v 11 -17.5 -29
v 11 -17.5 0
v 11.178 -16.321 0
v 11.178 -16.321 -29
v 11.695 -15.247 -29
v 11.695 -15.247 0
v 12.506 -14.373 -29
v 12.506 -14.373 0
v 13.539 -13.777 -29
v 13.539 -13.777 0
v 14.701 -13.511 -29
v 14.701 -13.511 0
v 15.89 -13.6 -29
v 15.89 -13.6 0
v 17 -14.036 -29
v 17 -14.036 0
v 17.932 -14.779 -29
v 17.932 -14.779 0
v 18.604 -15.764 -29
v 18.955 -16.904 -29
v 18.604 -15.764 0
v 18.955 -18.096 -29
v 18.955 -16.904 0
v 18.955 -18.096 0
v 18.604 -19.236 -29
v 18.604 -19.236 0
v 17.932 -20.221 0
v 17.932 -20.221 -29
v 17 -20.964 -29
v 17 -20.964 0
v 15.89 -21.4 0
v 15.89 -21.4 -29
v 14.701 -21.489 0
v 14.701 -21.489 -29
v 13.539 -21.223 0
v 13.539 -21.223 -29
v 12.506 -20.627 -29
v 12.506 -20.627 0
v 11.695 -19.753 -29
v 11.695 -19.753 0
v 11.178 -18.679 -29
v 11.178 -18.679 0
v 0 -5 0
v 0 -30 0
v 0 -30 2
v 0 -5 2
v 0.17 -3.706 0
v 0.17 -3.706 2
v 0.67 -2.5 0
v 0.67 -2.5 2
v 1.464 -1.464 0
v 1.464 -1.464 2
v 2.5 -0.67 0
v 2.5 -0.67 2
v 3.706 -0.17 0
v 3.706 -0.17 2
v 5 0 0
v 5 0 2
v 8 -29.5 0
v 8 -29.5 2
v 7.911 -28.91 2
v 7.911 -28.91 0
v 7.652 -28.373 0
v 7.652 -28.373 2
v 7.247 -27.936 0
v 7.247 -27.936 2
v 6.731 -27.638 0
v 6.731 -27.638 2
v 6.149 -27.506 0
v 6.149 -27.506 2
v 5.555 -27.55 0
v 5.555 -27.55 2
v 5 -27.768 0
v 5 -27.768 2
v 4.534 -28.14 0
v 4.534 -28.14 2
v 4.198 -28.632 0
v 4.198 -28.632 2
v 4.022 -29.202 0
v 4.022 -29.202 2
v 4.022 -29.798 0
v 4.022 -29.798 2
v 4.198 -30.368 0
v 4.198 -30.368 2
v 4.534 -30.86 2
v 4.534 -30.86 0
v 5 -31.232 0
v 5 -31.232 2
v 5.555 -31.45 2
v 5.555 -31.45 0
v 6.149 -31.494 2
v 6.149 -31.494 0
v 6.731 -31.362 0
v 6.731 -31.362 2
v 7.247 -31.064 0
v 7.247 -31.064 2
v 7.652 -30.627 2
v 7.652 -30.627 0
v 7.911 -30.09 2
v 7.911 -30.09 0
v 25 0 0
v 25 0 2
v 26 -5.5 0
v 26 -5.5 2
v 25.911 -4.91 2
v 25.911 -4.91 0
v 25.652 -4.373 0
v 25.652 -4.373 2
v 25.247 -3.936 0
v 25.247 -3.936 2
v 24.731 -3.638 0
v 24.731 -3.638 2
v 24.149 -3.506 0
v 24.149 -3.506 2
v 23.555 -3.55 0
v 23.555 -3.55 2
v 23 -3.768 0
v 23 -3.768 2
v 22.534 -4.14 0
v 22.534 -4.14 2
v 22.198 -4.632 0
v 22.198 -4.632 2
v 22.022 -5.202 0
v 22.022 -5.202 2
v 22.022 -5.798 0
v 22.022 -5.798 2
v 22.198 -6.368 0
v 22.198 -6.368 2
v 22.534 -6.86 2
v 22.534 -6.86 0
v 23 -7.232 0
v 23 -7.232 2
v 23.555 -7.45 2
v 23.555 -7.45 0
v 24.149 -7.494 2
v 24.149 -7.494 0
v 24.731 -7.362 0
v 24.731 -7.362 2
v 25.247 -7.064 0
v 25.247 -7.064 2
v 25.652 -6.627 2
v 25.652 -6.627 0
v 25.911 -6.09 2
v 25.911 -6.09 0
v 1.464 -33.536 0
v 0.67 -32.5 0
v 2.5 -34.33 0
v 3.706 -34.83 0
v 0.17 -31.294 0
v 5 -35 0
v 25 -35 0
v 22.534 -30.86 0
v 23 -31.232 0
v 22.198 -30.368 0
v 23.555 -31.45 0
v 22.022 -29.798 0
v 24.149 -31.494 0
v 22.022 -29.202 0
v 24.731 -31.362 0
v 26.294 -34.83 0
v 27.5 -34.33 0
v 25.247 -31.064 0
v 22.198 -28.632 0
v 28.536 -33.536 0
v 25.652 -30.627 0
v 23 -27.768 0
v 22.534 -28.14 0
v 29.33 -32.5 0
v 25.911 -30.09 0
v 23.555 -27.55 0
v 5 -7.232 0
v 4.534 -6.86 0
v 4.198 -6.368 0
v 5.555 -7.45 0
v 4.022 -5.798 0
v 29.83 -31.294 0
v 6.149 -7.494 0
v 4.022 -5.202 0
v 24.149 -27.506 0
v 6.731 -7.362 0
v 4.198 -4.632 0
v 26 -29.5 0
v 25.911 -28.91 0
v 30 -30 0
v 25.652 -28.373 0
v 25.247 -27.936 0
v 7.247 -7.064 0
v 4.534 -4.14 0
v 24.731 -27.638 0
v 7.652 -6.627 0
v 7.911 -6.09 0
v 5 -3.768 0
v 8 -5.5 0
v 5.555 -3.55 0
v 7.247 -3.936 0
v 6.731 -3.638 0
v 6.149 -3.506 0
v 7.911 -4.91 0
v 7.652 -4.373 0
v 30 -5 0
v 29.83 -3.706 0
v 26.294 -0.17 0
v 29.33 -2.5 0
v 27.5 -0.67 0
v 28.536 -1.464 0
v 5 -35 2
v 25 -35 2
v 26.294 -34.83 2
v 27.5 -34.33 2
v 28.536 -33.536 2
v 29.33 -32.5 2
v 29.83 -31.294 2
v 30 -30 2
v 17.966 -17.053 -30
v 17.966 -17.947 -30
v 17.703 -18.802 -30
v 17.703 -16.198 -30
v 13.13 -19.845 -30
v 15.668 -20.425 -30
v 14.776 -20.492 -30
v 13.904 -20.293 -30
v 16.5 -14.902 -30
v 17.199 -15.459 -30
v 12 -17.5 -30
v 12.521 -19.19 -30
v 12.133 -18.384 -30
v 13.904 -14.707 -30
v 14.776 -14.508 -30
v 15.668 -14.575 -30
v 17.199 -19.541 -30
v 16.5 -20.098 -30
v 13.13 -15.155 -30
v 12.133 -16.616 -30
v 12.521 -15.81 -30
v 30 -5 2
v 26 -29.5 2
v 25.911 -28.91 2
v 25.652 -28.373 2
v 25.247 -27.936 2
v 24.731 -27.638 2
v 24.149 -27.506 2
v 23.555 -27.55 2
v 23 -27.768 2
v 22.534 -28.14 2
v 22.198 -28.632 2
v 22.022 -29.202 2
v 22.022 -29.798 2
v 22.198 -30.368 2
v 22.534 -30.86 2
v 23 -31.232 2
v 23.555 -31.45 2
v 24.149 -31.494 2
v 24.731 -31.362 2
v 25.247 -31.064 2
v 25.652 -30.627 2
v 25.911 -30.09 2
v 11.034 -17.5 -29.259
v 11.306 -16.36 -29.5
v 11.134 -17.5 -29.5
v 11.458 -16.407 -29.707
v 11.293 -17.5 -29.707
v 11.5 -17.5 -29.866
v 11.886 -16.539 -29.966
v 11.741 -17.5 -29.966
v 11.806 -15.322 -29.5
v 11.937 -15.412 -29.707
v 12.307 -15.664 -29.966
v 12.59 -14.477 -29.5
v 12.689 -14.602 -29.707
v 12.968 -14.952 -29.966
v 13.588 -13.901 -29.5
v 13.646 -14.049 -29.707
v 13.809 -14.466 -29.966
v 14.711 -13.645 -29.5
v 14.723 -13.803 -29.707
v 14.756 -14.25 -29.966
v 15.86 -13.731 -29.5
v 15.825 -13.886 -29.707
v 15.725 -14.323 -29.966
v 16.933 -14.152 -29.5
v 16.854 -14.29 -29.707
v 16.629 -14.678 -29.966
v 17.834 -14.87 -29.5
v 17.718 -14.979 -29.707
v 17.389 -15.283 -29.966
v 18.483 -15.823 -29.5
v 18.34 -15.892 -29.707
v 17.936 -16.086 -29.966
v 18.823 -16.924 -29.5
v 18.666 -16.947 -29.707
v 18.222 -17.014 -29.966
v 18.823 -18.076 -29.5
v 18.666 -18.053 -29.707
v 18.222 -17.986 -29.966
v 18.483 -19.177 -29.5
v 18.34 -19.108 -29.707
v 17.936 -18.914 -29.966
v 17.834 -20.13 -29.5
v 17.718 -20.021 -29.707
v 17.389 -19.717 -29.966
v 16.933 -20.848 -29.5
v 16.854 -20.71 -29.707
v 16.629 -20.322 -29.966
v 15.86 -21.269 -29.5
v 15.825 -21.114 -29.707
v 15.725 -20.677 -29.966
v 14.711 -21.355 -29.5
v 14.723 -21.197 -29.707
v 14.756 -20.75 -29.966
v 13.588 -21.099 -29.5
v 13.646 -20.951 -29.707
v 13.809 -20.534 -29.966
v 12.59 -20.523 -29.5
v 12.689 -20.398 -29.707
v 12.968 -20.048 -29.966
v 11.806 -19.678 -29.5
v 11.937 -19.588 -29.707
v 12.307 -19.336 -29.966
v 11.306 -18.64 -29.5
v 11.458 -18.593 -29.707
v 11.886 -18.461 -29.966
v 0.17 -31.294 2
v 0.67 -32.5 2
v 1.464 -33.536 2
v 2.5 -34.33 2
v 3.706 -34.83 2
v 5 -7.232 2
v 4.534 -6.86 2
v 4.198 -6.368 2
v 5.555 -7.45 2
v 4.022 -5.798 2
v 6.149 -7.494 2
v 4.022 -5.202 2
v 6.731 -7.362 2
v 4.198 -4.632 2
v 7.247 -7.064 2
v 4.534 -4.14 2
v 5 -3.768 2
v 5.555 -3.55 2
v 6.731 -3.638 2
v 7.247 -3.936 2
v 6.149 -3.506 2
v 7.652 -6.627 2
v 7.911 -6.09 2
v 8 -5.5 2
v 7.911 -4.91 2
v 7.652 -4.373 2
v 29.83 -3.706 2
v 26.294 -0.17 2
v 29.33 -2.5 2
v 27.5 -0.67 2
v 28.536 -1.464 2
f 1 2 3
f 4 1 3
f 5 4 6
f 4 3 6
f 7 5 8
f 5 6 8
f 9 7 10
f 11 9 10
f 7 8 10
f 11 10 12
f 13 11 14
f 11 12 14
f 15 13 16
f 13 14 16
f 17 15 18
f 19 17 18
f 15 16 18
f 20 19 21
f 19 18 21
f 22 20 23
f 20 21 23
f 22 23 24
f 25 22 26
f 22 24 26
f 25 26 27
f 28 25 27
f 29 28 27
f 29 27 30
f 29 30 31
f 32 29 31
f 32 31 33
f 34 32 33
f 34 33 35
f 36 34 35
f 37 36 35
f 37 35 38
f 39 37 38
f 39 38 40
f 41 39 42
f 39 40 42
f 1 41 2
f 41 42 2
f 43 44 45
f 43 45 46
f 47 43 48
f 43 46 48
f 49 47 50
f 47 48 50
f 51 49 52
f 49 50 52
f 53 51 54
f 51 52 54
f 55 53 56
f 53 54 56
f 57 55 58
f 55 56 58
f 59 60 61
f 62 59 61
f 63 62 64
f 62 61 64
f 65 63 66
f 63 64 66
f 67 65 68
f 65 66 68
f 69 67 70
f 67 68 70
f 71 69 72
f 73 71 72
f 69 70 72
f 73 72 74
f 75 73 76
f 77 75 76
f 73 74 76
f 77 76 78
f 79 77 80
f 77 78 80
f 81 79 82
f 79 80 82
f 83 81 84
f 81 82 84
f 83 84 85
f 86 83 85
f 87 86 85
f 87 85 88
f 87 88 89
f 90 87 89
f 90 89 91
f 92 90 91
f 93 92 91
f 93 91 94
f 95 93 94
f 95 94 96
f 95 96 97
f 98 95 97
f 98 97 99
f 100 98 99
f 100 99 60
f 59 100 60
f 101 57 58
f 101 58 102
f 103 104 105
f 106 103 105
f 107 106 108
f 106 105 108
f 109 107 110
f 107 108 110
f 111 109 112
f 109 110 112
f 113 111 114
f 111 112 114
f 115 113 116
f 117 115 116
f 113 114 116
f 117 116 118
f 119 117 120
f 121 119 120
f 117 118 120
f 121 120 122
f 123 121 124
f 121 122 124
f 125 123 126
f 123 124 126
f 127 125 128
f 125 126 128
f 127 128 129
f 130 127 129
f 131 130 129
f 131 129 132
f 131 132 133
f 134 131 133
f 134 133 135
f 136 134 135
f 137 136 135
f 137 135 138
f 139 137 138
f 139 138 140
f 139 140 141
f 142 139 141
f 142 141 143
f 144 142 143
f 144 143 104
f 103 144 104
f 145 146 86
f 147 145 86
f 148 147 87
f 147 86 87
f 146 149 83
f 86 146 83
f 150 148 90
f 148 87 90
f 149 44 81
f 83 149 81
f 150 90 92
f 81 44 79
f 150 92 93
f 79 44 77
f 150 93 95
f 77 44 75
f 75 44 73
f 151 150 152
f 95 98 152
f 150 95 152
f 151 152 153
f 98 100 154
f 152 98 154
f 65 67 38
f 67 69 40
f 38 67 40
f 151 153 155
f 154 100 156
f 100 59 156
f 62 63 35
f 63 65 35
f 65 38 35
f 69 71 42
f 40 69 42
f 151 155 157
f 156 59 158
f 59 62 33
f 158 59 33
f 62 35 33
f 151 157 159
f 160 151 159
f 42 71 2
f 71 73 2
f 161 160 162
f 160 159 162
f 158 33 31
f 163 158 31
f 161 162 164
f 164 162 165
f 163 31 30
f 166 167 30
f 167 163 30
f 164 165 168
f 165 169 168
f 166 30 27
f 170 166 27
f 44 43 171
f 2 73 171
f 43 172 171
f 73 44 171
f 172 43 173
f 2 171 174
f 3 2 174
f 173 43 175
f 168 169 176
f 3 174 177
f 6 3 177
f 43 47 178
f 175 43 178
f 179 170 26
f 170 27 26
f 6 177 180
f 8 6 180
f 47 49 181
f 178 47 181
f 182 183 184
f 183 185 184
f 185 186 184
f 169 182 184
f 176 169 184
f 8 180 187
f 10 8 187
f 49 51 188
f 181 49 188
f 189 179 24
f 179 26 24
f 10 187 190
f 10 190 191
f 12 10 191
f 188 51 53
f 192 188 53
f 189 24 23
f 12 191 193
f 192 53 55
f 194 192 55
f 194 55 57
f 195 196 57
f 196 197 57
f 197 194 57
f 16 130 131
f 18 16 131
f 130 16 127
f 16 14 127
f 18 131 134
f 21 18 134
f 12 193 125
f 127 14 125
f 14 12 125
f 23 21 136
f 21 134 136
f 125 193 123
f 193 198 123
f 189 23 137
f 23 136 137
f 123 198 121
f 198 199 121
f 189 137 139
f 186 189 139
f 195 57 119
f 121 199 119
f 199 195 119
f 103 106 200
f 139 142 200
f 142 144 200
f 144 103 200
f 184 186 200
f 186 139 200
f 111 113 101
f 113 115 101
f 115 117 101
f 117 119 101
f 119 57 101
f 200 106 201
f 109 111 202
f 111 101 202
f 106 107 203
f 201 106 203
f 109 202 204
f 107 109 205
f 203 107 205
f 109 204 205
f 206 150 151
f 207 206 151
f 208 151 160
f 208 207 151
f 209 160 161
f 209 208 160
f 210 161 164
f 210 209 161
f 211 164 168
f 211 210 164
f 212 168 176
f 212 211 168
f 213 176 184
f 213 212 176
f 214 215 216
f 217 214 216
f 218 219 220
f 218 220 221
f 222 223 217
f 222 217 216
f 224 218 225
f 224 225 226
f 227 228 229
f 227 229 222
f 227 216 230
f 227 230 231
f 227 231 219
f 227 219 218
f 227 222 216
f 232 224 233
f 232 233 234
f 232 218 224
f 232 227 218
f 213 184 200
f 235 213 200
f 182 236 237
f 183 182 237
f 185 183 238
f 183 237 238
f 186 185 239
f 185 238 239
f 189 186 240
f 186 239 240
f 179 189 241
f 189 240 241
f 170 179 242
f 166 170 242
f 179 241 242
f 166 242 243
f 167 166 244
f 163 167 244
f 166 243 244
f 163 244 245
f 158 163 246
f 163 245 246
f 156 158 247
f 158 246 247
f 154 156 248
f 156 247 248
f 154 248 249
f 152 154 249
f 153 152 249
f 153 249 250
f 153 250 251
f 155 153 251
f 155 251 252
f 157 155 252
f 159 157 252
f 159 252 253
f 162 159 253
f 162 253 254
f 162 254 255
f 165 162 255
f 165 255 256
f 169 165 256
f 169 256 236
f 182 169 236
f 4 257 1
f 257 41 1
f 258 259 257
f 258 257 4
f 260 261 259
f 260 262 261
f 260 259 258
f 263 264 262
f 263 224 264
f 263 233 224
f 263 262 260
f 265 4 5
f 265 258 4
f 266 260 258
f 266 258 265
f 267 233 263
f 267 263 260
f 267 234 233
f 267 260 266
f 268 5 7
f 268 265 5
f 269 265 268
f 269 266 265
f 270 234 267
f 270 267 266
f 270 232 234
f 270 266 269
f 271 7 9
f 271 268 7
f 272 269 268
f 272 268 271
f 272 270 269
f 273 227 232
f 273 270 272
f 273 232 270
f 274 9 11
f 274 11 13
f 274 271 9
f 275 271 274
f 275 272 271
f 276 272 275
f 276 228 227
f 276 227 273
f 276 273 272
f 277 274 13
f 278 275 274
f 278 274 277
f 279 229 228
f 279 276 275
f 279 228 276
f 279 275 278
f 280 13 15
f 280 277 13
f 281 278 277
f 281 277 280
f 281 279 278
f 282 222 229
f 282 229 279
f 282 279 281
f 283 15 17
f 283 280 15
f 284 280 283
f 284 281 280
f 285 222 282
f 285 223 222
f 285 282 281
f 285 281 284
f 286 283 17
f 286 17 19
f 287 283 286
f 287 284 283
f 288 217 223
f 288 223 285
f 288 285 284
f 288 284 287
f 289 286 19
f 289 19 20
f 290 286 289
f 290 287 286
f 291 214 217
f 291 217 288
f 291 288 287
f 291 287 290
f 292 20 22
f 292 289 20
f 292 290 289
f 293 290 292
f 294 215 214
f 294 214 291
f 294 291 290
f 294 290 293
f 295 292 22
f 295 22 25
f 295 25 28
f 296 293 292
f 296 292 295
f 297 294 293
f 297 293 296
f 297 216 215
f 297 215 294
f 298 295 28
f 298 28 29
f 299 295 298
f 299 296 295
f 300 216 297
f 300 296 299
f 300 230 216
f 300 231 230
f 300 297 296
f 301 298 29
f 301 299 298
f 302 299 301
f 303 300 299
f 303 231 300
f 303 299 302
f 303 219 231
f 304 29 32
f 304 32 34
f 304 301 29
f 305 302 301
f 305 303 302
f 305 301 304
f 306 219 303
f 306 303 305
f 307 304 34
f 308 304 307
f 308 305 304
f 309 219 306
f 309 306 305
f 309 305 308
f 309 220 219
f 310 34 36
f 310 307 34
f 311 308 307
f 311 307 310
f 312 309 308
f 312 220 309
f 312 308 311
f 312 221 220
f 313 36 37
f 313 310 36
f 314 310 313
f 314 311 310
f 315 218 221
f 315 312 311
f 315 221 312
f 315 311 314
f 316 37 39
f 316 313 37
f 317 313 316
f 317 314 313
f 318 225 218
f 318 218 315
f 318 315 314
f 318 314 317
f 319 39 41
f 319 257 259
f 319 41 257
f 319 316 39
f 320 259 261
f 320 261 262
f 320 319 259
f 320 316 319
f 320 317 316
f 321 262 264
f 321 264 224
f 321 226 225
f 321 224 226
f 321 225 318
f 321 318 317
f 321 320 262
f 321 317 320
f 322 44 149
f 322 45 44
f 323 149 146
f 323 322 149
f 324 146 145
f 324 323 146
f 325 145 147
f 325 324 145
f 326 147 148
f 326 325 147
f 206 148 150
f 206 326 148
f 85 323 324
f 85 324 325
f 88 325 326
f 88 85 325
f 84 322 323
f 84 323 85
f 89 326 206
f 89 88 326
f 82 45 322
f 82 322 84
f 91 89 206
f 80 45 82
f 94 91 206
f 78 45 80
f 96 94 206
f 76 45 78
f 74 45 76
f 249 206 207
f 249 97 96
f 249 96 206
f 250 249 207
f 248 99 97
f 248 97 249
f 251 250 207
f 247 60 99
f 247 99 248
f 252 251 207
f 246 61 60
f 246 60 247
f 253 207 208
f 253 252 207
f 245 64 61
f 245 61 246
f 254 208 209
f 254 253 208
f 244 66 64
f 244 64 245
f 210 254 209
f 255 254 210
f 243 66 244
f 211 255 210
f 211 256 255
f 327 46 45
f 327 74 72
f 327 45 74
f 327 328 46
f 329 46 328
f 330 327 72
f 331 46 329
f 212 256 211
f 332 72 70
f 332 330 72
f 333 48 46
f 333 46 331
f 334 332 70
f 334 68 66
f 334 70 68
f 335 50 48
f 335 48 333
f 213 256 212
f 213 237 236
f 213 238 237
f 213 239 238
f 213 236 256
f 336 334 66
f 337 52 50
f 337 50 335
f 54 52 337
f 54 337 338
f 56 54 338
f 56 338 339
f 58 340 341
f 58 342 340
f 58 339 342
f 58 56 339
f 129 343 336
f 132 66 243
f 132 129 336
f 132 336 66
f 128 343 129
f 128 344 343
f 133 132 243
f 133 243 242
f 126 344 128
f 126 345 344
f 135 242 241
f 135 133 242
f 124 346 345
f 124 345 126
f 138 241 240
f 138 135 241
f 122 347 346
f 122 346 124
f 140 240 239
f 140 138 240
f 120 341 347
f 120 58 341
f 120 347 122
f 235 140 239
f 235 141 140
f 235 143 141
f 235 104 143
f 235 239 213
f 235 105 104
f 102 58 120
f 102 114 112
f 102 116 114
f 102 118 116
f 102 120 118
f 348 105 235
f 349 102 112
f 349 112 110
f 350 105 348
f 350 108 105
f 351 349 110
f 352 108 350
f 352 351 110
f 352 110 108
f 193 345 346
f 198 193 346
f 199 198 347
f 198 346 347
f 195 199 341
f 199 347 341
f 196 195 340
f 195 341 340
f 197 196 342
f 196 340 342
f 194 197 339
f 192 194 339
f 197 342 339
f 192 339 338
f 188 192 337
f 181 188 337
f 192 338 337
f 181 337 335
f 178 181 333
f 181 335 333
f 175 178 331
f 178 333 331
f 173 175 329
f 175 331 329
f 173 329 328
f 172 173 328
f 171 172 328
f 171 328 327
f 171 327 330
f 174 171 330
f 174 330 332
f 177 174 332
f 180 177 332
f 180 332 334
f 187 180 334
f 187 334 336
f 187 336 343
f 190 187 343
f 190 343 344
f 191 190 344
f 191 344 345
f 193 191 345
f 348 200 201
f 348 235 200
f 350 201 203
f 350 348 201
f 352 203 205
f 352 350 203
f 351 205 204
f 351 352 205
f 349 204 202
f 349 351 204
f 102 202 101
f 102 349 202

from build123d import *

# Parameters (mm, degrees)
SKETCH2_W           = 30
SKETCH2_H           = 35
BOSS_EXTRUDE1_DEPTH = 2
FILLET1_R           = 5
SKETCH3_R           = 2
CUT_EXTRUDE1_DEPTH  = 10
SKETCH6_R           = 4
BOSS_EXTRUDE2_DEPTH = 30
FILLET2_R           = 1


with BuildPart() as part:
    # Sketch2 → Boss-Extrude1 (new body)
    with BuildSketch(Plane.XY):
        with Locations((15, -17.5)):
            Rectangle(SKETCH2_W, SKETCH2_H)
    extrude(amount=BOSS_EXTRUDE1_DEPTH)

    # Fillet1
    fillet1_edges = [part.edges().sort_by_distance(p)[0] for p in [
        (0, 0, 1),
        (30, 0, 1),
        (30, -35, 1),
        (0, -35, 1),
    ]]
    fillet(fillet1_edges, radius=FILLET1_R)

    # Sketch3 → Cut-Extrude1 (cut)
    with BuildSketch(Plane.XY.offset(2)):
        with Locations((6, -5.5)):
            Circle(SKETCH3_R)
        with Locations((24, -5.5)):
            Circle(SKETCH3_R)
        with Locations((6, -29.5)):
            Circle(SKETCH3_R)
        with Locations((24, -29.5)):
            Circle(SKETCH3_R)
    extrude(amount=-CUT_EXTRUDE1_DEPTH, mode=Mode.SUBTRACT)

    # Sketch6 → Boss-Extrude2 (add)
    with BuildSketch(Plane(origin=(0, 0, 0), x_dir=(-1, 0, 0), z_dir=(0, 0, -1))):
        with Locations((-15, -17.5)):
            Circle(SKETCH6_R)
    extrude(amount=BOSS_EXTRUDE2_DEPTH)

    # Fillet2
    fillet2_edges = [part.edges().sort_by_distance(p)[0] for p in [
        (19, -17.5, -30),
    ]]
    fillet(fillet2_edges, radius=FILLET2_R)


solid = part.part
